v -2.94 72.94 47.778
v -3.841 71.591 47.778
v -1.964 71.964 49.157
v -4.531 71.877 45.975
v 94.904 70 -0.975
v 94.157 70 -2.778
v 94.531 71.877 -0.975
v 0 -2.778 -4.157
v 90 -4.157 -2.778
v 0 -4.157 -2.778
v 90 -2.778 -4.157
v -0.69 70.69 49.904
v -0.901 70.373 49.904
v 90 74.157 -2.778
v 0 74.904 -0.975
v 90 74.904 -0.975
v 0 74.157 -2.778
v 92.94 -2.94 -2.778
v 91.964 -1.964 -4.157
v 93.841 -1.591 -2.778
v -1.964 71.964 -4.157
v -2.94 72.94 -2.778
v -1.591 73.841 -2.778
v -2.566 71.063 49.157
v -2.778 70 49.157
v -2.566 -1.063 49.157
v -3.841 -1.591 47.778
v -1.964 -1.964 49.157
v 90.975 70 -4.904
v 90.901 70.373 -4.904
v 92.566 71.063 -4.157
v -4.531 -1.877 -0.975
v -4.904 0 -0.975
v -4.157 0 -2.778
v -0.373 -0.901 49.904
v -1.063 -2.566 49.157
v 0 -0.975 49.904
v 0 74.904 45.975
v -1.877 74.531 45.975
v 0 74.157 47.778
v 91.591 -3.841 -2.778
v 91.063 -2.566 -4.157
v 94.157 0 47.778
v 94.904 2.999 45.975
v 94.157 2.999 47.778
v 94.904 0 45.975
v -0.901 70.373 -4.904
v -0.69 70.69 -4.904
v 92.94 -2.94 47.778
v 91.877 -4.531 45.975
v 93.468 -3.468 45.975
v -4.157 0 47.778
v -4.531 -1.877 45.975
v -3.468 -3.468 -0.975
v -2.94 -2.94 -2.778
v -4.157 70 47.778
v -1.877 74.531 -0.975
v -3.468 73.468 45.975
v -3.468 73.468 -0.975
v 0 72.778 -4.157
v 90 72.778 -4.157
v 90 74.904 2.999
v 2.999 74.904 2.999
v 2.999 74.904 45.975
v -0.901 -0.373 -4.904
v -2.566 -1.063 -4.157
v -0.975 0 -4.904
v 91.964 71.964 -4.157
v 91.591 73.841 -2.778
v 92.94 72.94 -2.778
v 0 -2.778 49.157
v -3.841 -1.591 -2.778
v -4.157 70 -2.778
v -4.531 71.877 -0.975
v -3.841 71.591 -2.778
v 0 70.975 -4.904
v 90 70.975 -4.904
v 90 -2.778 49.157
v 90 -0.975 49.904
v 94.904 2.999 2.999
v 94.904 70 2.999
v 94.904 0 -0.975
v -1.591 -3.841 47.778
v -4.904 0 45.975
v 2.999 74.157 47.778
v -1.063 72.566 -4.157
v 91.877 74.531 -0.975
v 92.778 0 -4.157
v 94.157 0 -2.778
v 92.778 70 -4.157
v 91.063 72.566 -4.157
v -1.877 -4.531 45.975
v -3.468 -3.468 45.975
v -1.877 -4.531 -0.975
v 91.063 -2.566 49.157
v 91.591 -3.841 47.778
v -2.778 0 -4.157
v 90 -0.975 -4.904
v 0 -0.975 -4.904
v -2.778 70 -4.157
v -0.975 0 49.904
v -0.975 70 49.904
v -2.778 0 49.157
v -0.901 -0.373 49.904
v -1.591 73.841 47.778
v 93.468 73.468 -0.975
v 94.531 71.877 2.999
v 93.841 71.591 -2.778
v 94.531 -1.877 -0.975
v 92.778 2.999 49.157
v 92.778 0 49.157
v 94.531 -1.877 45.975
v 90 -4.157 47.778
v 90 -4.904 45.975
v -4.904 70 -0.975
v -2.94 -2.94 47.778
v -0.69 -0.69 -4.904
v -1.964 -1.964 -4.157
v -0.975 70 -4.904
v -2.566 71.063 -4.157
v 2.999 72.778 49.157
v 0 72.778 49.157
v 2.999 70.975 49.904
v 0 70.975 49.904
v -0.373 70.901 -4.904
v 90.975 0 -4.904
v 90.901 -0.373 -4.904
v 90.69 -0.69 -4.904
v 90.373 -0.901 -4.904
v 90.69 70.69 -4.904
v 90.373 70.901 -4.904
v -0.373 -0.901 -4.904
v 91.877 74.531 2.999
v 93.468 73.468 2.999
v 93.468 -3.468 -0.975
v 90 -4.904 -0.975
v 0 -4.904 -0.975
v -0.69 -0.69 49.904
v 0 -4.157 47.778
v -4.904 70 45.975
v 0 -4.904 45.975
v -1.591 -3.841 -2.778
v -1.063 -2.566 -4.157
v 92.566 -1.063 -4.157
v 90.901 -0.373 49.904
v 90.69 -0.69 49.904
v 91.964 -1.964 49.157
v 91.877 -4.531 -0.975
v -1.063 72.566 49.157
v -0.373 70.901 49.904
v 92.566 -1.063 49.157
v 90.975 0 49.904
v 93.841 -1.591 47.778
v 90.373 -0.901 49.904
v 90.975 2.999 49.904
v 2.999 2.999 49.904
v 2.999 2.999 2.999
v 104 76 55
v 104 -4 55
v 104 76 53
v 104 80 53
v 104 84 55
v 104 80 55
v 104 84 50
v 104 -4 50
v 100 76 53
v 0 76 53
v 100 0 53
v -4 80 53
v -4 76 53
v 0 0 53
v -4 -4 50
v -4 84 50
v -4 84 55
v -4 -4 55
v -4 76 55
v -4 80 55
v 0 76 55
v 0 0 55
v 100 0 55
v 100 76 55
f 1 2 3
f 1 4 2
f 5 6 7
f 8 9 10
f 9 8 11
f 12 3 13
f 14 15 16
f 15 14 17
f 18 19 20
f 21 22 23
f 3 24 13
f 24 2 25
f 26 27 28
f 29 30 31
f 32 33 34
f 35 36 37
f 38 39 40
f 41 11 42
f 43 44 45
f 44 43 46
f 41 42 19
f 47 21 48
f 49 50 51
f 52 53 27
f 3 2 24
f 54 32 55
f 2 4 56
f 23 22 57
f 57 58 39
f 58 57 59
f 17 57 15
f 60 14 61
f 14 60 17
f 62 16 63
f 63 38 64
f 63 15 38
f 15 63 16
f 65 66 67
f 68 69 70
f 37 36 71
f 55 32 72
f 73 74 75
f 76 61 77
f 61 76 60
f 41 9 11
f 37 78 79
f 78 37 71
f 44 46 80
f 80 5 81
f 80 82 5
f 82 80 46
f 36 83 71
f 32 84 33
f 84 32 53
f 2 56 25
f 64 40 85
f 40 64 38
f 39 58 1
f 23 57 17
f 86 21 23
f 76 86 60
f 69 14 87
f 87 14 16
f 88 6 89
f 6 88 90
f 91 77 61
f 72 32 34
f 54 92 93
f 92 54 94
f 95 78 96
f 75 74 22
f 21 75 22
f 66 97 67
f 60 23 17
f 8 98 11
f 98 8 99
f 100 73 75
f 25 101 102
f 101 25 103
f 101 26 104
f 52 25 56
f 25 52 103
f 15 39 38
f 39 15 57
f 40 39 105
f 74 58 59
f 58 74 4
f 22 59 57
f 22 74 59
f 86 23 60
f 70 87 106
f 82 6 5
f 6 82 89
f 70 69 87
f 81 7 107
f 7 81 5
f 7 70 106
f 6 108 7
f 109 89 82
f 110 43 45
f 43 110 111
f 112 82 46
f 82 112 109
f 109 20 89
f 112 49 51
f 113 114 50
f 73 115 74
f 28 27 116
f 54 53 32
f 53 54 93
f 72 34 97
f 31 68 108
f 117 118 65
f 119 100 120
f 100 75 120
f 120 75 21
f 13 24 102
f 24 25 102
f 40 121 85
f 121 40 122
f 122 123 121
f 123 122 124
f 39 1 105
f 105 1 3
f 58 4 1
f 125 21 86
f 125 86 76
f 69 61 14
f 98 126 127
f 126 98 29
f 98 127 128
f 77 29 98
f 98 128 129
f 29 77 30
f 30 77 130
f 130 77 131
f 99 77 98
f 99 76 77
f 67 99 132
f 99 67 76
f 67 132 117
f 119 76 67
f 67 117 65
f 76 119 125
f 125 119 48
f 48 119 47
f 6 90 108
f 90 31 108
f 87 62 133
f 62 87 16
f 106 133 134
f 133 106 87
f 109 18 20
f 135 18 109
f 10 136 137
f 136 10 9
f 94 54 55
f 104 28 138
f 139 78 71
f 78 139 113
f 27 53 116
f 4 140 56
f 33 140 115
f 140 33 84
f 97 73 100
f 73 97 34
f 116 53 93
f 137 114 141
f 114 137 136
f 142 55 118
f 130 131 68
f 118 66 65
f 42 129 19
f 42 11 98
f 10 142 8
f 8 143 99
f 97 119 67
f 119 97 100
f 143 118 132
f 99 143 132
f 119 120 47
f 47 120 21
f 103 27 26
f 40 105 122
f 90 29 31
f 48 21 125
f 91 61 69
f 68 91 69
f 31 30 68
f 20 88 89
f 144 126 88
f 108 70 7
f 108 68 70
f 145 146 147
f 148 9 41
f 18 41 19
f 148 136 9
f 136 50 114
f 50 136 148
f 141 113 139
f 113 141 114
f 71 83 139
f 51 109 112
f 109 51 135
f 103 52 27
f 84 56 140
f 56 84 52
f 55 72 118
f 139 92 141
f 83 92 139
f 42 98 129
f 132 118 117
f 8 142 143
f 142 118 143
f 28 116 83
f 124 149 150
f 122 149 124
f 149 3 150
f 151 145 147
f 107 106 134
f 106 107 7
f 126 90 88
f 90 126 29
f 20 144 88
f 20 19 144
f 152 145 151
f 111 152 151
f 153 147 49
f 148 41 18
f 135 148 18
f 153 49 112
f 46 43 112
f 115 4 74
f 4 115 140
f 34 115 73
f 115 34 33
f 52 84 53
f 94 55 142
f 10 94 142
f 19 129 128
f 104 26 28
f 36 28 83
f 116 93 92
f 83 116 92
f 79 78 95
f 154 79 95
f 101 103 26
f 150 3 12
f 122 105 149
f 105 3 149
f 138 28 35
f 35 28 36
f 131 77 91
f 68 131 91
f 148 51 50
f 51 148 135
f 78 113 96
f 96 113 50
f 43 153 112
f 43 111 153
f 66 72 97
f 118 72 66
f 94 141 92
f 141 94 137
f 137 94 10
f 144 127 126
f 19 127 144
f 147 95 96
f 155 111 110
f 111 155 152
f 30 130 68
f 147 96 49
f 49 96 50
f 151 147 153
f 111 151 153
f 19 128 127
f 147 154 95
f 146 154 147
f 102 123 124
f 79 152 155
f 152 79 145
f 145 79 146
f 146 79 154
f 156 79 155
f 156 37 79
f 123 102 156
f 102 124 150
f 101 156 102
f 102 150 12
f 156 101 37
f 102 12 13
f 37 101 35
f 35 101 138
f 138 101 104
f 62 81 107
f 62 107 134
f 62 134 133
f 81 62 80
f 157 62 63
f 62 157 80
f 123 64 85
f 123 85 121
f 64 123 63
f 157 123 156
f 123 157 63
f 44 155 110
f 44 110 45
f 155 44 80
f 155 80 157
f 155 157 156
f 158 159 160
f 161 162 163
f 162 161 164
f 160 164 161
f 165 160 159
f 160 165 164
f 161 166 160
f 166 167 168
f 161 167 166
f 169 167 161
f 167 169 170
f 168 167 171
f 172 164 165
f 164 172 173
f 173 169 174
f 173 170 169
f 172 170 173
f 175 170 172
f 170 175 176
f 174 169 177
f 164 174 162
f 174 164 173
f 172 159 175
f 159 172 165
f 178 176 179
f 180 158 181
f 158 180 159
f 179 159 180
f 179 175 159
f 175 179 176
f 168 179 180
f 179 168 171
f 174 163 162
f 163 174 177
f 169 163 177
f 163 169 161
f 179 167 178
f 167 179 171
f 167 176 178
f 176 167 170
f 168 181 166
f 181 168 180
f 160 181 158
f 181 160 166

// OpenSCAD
// Parametrisk låda med lock - v4
// ~~~~~~~~~~~~~~~~~~~~~~~~~~~~~
// Metod: Hel kub med chamfer (mink) + inre cube för väggtjocklek.
// Lock med lip som hänger ner utanpå lådan.
// Locket placeras exakt ovanpå lådan med korrekt överhäng.

// === Grundparametrar ===
box_w         = 100;   // Total bredd
box_d         = 80;    // Total djup
box_h         = 50;    // Total höjd
wall_thickness = 3;     // Väggtjocklek
chamfer_r     = 5;     // Chamfer-radie på yttre kanter

// === Lockparametrar ===
lid_overhang  = 4;     // Överhäng runt hela lådan
lid_plate_h   = 3;     // Lockplattans tjocklek
lid_lip_h     = 5;     // Lip/hängsle som hänger ner
// Total lockhöjd = 8mm

// === Bottenlåda med chamferade kanter ===
module chamfered_box(outer_w, outer_d, outer_h, wt, cr) {
    // Yttre form med chamfer + inre kub för väggtjocklek
    difference() {
        // Yttre kub med chamfer
        minkowski() {
            cube([outer_w - 2*cr, outer_d - 2*cr, outer_h - cr], center=false);
            sphere(r=cr);
        }
        
        // Inre kub - skär ut insidan
        // Botten och väggar får tjocklek wt
        translate([wt - 0.001, wt - 0.001, wt - 0.001])
            cube([outer_w - 2*wt + 0.002, outer_d - 2*wt + 0.002, outer_h - wt + 0.002]);
    }
}

// === Lock med lip ===
module lid_box(overhang, plate_h, lip_h) {
    // Lockplattans yttre mått
    plate_w = box_w + 2*overhang;
    plate_d = box_d + 2*overhang;
    
    // Lockplattan (övre plana delen)
    cube([plate_w, plate_d, plate_h], center=false);
    
    // Lip (kant som hänger ner på alla fyra sidor)
    // Fram
    cube([plate_w, overhang, lip_h], center=false);
    // Bak
    translate([0, plate_d - overhang, 0])
        cube([plate_w, overhang, lip_h], center=false);
    // Vänster (mellan fram och bak för att undvika dubbel-material)
    translate([0, 0, 0])
        cube([overhang, plate_d - 2*overhang, lip_h], center=false);
    // Höger
    translate([plate_w - overhang, 0, 0])
        cube([overhang, plate_d - 2*overhang, lip_h], center=false);
}

// === Huvudsektion ===
union() {
    // Bottenlåda
    color([0.35, 0.55, 0.85])
    translate([0, 0, 0])
    chamfered_box(box_w, box_d, box_h, wall_thickness, chamfer_r);
    
    // Lock (placerat ovanpå, centrerat)
    color([0.85, 0.35, 0.35])
    // Lockets bas (botten av lippen) ska vara exakt vid lådans övre kant
    // Lockets x/y-position: lådans kant är vid 0..box_w / 0..box_d
    // Locket är box_w + 2*overhang, så vänster kant = -overhang
    translate([-lid_overhang, -lid_overhang, box_h])
    lid_box(lid_overhang, lid_plate_h, lid_lip_h);
}

echo("Box: ", box_w, "x", box_d, "x", box_h);
echo("Lid: overhang=", lid_overhang, " total_h=", lid_plate_h + lid_lip_h);
